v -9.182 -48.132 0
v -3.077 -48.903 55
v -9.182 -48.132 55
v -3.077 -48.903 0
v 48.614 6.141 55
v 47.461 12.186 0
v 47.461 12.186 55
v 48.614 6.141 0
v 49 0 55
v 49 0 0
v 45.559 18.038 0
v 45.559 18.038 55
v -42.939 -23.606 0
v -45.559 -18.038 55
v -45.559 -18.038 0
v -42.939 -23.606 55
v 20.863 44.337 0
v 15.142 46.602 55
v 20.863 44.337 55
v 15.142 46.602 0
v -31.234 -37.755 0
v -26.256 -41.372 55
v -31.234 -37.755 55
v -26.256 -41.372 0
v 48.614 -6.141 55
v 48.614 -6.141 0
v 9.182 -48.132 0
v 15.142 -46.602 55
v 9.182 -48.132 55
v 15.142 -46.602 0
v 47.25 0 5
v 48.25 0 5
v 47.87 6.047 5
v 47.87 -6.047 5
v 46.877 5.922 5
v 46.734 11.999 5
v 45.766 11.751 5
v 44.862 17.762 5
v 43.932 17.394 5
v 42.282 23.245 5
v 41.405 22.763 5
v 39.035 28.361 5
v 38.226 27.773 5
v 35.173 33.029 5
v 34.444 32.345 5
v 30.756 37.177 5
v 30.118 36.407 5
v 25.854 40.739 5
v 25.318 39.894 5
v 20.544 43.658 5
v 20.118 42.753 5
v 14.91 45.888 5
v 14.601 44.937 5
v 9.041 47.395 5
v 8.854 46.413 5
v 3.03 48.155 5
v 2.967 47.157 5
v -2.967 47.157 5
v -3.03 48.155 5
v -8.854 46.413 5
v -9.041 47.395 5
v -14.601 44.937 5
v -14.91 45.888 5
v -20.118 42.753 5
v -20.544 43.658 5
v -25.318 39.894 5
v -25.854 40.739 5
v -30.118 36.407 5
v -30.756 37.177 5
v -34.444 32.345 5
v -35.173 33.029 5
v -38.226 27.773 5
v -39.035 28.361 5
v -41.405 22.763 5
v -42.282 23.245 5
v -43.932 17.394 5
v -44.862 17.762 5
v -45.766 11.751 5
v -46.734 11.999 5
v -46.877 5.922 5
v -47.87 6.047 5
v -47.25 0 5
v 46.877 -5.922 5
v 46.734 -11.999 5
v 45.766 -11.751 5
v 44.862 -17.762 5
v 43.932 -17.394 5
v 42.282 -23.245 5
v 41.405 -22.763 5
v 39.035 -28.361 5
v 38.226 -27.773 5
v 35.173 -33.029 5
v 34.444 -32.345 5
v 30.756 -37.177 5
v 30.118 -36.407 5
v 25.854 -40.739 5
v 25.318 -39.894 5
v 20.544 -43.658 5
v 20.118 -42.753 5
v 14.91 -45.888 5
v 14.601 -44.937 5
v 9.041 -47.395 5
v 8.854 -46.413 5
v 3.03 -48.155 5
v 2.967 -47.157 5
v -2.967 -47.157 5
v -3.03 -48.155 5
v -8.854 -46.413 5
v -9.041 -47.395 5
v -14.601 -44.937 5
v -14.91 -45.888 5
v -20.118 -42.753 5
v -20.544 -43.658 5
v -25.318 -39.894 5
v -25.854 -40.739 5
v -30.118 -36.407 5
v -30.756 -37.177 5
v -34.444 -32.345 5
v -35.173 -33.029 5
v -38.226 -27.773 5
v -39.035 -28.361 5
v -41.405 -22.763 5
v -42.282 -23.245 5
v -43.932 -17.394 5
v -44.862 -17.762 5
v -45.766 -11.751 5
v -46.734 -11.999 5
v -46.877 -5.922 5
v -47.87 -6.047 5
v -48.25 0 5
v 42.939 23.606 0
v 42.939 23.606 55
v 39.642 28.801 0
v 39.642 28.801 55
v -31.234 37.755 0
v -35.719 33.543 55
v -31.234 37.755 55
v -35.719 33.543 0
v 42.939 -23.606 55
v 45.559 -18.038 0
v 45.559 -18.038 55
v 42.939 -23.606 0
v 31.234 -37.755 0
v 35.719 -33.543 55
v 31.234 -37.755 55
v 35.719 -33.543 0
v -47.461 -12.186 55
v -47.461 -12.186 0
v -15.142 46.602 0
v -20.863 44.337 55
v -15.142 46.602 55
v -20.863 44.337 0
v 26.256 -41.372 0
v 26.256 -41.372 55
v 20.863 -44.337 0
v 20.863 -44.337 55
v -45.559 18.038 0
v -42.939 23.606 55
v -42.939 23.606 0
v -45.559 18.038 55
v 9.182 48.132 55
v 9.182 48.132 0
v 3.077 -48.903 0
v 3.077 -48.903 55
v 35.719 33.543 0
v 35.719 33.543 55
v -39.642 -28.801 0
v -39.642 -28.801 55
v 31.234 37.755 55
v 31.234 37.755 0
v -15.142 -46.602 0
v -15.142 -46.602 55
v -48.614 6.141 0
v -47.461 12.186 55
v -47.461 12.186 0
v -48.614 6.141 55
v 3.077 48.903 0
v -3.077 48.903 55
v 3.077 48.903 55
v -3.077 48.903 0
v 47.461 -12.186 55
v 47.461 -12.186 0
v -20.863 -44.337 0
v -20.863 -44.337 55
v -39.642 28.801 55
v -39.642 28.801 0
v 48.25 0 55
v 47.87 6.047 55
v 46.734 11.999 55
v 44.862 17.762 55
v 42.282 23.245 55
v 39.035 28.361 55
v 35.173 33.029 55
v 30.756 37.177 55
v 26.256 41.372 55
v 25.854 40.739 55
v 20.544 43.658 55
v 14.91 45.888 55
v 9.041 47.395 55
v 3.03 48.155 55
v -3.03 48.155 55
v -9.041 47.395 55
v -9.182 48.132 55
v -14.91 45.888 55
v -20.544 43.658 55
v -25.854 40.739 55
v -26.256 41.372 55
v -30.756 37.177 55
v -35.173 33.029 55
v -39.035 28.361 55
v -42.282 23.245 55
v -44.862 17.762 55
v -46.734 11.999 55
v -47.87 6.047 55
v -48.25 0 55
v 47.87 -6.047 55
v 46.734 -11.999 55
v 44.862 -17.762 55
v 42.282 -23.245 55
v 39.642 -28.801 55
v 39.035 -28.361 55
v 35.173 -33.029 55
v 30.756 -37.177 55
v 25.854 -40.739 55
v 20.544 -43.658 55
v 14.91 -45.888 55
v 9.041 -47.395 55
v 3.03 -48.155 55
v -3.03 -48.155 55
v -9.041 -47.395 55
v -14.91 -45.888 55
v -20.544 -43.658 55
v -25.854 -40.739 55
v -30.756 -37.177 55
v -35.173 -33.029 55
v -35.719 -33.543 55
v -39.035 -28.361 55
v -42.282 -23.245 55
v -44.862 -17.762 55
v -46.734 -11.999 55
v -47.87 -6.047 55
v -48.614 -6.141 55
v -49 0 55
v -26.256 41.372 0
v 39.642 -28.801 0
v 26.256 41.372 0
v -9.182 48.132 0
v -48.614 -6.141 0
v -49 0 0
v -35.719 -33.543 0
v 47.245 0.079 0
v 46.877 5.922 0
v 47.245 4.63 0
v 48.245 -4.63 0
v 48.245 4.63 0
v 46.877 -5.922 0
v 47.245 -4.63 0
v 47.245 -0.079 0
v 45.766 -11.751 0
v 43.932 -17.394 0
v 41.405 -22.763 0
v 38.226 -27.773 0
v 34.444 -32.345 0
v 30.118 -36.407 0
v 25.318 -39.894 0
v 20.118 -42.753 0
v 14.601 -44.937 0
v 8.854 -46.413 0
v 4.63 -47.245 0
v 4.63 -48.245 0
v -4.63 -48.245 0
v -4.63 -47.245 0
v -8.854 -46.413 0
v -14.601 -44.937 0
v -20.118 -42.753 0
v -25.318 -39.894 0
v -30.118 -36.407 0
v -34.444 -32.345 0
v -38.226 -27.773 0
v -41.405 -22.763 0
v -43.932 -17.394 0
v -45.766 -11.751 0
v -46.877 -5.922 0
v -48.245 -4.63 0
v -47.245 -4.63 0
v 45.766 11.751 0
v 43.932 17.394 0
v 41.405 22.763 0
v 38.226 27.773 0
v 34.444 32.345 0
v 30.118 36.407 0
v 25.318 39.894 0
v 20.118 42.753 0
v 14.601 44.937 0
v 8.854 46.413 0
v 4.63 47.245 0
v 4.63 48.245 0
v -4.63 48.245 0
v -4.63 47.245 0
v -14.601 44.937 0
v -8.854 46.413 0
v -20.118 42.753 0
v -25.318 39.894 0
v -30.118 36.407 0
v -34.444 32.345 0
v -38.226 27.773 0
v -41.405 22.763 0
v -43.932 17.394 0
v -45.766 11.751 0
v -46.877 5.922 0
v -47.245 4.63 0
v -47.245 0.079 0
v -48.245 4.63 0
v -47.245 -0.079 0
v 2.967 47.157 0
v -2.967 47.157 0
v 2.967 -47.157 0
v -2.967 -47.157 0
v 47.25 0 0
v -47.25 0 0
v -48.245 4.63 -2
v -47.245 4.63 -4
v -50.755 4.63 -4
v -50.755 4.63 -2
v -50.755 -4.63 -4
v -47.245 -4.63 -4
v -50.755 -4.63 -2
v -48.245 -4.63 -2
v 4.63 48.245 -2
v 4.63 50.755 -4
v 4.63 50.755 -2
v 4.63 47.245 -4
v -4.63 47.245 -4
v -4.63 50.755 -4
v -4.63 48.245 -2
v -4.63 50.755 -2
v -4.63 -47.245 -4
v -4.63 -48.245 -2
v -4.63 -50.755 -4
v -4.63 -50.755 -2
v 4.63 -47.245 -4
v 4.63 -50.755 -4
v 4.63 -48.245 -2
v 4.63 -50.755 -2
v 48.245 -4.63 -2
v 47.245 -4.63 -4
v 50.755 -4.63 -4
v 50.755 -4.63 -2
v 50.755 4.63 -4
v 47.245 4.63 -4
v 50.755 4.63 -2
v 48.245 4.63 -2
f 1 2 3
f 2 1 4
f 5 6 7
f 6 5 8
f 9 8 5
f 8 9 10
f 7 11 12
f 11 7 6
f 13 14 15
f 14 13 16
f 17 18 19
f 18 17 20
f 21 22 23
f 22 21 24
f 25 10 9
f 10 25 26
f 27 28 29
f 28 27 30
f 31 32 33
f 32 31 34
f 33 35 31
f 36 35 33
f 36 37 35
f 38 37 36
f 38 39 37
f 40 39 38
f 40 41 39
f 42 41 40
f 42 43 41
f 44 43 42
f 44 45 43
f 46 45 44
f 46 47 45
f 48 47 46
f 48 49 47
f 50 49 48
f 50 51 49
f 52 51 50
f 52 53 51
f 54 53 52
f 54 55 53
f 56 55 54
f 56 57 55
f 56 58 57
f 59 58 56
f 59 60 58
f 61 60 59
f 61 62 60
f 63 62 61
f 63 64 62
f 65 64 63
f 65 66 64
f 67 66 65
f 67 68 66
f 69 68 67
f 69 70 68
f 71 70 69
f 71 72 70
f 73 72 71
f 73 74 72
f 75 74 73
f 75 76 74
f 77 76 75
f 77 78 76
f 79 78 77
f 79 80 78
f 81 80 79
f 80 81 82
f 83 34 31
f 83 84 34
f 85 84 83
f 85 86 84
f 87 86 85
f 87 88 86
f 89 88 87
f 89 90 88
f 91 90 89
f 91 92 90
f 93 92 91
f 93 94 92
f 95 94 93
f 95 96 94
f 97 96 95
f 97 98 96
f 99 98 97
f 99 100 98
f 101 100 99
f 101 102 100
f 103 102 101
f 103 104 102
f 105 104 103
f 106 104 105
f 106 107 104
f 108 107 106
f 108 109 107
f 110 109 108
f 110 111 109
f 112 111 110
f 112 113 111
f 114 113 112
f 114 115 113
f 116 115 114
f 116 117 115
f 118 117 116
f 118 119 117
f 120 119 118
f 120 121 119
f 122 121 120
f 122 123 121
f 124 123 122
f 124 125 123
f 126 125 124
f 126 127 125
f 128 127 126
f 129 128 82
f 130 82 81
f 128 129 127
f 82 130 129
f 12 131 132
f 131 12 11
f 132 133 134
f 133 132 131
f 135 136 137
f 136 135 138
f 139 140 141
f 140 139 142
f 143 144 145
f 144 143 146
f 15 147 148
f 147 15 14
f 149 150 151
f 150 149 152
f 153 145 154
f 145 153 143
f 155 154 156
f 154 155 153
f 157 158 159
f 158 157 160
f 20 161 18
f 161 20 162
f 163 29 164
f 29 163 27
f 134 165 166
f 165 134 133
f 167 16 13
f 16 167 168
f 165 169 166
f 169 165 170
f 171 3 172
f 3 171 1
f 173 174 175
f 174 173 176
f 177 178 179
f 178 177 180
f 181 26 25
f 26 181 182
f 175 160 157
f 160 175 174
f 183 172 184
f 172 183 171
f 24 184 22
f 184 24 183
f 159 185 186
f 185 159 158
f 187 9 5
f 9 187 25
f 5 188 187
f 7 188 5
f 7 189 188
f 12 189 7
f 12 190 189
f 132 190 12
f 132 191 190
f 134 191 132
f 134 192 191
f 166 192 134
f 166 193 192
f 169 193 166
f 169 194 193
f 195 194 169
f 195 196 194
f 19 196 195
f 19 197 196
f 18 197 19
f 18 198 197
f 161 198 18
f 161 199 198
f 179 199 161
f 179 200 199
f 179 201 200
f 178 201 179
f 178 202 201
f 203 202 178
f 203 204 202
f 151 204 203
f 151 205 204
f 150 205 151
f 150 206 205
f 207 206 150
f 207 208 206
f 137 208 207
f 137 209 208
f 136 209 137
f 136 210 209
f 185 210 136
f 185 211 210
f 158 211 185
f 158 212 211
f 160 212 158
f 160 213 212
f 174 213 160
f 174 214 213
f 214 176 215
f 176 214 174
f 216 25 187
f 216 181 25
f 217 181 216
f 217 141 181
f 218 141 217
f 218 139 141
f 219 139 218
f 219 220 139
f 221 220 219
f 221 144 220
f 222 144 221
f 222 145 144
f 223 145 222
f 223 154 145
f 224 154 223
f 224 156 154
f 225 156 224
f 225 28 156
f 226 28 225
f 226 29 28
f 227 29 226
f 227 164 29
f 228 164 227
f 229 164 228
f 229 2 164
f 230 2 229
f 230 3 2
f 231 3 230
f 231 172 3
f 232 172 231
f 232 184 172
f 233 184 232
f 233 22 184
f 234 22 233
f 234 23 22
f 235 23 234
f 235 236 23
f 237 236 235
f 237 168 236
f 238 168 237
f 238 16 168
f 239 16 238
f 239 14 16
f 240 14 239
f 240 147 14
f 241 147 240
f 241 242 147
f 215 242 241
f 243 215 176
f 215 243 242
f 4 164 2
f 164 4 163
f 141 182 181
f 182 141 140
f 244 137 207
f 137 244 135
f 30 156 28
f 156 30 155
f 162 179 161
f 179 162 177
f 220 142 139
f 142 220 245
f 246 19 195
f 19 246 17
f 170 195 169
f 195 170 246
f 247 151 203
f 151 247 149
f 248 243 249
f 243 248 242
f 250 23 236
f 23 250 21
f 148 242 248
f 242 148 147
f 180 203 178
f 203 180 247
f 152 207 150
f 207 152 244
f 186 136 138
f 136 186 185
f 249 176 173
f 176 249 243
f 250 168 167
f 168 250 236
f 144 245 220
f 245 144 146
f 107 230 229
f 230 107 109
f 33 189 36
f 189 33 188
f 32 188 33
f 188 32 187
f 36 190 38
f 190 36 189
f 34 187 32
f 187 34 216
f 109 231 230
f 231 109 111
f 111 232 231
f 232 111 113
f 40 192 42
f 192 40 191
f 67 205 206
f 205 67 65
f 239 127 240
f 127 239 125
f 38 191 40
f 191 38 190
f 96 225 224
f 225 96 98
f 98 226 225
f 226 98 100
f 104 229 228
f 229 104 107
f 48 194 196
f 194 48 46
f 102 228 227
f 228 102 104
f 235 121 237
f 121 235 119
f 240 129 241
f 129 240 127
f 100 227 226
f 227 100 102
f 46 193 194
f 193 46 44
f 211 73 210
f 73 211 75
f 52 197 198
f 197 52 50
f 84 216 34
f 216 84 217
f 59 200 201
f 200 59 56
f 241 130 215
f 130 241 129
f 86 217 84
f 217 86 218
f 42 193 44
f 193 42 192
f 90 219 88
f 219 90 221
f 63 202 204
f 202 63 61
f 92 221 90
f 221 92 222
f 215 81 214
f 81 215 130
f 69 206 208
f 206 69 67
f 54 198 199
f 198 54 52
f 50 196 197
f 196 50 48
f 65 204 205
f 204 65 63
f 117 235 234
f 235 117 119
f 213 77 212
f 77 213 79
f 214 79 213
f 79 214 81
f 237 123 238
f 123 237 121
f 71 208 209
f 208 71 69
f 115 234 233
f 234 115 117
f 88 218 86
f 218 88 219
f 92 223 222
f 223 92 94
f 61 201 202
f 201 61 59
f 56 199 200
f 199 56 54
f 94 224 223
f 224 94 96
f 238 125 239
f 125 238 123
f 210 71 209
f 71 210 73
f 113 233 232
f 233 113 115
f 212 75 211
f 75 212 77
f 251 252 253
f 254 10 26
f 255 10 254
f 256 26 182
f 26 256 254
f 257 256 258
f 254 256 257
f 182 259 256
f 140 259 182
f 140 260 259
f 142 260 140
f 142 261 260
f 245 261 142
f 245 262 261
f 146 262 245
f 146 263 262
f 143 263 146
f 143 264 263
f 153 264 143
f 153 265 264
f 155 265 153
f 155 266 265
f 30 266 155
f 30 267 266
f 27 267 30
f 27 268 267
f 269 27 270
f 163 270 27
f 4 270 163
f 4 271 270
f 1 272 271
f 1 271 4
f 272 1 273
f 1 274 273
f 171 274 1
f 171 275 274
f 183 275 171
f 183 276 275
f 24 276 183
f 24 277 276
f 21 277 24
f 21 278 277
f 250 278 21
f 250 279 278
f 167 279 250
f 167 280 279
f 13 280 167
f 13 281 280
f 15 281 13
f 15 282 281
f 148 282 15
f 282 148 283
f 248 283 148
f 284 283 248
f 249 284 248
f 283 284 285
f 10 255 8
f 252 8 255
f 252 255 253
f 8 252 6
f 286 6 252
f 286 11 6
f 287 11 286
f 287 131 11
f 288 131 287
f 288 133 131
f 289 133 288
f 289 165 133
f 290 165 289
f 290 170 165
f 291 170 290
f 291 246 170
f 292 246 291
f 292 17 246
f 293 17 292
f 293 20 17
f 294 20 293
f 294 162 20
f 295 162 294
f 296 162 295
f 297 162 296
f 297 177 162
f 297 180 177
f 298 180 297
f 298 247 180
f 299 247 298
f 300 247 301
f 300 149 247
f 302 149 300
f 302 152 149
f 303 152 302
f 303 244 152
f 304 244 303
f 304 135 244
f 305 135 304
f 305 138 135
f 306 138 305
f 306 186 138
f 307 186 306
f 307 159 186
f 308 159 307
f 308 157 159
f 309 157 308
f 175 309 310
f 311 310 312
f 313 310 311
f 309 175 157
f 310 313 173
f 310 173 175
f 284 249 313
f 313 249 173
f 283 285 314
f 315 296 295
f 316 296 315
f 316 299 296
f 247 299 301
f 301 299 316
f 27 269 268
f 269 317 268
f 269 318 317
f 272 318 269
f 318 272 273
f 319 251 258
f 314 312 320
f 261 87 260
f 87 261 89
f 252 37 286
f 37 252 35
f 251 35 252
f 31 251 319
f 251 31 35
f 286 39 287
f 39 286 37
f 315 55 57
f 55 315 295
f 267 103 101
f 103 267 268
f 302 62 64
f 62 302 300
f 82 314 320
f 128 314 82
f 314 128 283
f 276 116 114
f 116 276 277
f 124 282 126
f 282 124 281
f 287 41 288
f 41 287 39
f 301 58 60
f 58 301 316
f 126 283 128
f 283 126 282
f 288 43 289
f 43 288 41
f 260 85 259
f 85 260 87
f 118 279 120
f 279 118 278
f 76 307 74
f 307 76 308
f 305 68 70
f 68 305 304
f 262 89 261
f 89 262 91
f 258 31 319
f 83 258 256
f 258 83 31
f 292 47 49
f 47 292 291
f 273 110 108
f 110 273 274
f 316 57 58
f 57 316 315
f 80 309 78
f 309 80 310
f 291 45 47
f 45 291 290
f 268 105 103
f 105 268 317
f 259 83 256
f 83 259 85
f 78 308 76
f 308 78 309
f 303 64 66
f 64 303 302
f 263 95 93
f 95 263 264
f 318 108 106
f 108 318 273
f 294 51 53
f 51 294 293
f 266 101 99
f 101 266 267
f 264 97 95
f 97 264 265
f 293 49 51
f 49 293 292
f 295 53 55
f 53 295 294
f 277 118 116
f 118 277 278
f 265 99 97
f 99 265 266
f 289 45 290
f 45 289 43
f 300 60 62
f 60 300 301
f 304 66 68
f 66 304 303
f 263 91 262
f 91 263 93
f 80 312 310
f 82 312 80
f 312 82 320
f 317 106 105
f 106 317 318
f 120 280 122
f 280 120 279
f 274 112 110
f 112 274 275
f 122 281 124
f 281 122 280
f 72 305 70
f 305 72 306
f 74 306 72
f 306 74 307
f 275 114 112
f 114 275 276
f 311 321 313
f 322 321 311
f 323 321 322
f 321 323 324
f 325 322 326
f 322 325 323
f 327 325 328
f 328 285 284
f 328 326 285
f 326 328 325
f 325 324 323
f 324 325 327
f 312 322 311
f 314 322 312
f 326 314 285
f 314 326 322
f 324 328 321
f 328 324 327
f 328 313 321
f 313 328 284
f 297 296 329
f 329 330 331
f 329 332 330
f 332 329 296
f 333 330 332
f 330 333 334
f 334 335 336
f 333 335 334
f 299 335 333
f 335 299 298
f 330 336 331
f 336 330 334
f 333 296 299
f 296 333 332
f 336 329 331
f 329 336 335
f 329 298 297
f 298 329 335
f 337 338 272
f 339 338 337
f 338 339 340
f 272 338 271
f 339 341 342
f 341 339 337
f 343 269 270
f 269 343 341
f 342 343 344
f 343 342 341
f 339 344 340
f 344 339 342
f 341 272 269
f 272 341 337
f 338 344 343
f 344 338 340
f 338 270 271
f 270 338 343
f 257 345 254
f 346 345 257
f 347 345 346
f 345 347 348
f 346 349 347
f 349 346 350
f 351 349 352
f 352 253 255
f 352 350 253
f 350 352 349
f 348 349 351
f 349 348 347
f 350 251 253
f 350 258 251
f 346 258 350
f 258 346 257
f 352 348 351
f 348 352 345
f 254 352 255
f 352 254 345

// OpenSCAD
//linear_extrude(height =20)
Diameter=98;
Height=50;
Thick=1.5;

HubDiameter=Diameter;
HubHeight=5;
HubThick=3.5;
LockRadius=49.0;
$fn=50;
Shade(1);
for (a=[0:30:360]){
// echo(a)
//lock(a,LockRadius,3.51,3.5,-.5);
};
//lock(100,LockRadius,3.51,4);

module lock(Rot,OffSet,SizeX,SizeY,AdjZ){
    translate([0,0,AdjZ]){
        rotate([0,0,Rot]){
            translate([0,OffSet,-(SizeY/2)]){
                difference(){
                cube([9.26,SizeX,SizeY],true);
                    translate([0,1,SizeY/2]){    
                        cube([9.26,SizeX,SizeY],true);
                    }
                }
            }
        }
    }
}
module lock2(Rot,OffSet,SizeX,SizeY){
    rotate([0,0,Rot]){
        translate([0,OffSet,-2]){
            difference(){
            cube([9.26,SizeX,SizeY],true);
                translate([0,1,SizeY/2]){    
                    cube([9.26,SizeX,SizeY],true);
                }
            }
        }
    }
}
module Shade(go) {
rotate([0,0,0]){
union(){
translate([0,0,HubHeight]){
    Tube(Diameter,Height,Thick);
}
union(){
union(){
union(){
union(){
    Tube(HubDiameter,HubHeight,HubThick);
    lock(90,LockRadius,3.51,4);
}
lock(0,LockRadius,3.51,4);
}
lock(180,LockRadius,3.51,4);
}
lock(270,LockRadius,3.51,4);
}
}
}
}

module lock1(Rot,OffSet){
    rotate([0,0,Rot]){
        translate([0,OffSet,-2]){
            difference(){
            cube([9.26,4.11,4],true);
                translate([0,1,2]){    
                    cube([9.26,4.11,4],true);
                }
            }
        }
    }
}
module Tube(Diameter,Height,Thick) {
    difference(){
        cylinder(d=Diameter,h=Height);
        cylinder(d=(Diameter-Thick),h=Height);
    }
}
